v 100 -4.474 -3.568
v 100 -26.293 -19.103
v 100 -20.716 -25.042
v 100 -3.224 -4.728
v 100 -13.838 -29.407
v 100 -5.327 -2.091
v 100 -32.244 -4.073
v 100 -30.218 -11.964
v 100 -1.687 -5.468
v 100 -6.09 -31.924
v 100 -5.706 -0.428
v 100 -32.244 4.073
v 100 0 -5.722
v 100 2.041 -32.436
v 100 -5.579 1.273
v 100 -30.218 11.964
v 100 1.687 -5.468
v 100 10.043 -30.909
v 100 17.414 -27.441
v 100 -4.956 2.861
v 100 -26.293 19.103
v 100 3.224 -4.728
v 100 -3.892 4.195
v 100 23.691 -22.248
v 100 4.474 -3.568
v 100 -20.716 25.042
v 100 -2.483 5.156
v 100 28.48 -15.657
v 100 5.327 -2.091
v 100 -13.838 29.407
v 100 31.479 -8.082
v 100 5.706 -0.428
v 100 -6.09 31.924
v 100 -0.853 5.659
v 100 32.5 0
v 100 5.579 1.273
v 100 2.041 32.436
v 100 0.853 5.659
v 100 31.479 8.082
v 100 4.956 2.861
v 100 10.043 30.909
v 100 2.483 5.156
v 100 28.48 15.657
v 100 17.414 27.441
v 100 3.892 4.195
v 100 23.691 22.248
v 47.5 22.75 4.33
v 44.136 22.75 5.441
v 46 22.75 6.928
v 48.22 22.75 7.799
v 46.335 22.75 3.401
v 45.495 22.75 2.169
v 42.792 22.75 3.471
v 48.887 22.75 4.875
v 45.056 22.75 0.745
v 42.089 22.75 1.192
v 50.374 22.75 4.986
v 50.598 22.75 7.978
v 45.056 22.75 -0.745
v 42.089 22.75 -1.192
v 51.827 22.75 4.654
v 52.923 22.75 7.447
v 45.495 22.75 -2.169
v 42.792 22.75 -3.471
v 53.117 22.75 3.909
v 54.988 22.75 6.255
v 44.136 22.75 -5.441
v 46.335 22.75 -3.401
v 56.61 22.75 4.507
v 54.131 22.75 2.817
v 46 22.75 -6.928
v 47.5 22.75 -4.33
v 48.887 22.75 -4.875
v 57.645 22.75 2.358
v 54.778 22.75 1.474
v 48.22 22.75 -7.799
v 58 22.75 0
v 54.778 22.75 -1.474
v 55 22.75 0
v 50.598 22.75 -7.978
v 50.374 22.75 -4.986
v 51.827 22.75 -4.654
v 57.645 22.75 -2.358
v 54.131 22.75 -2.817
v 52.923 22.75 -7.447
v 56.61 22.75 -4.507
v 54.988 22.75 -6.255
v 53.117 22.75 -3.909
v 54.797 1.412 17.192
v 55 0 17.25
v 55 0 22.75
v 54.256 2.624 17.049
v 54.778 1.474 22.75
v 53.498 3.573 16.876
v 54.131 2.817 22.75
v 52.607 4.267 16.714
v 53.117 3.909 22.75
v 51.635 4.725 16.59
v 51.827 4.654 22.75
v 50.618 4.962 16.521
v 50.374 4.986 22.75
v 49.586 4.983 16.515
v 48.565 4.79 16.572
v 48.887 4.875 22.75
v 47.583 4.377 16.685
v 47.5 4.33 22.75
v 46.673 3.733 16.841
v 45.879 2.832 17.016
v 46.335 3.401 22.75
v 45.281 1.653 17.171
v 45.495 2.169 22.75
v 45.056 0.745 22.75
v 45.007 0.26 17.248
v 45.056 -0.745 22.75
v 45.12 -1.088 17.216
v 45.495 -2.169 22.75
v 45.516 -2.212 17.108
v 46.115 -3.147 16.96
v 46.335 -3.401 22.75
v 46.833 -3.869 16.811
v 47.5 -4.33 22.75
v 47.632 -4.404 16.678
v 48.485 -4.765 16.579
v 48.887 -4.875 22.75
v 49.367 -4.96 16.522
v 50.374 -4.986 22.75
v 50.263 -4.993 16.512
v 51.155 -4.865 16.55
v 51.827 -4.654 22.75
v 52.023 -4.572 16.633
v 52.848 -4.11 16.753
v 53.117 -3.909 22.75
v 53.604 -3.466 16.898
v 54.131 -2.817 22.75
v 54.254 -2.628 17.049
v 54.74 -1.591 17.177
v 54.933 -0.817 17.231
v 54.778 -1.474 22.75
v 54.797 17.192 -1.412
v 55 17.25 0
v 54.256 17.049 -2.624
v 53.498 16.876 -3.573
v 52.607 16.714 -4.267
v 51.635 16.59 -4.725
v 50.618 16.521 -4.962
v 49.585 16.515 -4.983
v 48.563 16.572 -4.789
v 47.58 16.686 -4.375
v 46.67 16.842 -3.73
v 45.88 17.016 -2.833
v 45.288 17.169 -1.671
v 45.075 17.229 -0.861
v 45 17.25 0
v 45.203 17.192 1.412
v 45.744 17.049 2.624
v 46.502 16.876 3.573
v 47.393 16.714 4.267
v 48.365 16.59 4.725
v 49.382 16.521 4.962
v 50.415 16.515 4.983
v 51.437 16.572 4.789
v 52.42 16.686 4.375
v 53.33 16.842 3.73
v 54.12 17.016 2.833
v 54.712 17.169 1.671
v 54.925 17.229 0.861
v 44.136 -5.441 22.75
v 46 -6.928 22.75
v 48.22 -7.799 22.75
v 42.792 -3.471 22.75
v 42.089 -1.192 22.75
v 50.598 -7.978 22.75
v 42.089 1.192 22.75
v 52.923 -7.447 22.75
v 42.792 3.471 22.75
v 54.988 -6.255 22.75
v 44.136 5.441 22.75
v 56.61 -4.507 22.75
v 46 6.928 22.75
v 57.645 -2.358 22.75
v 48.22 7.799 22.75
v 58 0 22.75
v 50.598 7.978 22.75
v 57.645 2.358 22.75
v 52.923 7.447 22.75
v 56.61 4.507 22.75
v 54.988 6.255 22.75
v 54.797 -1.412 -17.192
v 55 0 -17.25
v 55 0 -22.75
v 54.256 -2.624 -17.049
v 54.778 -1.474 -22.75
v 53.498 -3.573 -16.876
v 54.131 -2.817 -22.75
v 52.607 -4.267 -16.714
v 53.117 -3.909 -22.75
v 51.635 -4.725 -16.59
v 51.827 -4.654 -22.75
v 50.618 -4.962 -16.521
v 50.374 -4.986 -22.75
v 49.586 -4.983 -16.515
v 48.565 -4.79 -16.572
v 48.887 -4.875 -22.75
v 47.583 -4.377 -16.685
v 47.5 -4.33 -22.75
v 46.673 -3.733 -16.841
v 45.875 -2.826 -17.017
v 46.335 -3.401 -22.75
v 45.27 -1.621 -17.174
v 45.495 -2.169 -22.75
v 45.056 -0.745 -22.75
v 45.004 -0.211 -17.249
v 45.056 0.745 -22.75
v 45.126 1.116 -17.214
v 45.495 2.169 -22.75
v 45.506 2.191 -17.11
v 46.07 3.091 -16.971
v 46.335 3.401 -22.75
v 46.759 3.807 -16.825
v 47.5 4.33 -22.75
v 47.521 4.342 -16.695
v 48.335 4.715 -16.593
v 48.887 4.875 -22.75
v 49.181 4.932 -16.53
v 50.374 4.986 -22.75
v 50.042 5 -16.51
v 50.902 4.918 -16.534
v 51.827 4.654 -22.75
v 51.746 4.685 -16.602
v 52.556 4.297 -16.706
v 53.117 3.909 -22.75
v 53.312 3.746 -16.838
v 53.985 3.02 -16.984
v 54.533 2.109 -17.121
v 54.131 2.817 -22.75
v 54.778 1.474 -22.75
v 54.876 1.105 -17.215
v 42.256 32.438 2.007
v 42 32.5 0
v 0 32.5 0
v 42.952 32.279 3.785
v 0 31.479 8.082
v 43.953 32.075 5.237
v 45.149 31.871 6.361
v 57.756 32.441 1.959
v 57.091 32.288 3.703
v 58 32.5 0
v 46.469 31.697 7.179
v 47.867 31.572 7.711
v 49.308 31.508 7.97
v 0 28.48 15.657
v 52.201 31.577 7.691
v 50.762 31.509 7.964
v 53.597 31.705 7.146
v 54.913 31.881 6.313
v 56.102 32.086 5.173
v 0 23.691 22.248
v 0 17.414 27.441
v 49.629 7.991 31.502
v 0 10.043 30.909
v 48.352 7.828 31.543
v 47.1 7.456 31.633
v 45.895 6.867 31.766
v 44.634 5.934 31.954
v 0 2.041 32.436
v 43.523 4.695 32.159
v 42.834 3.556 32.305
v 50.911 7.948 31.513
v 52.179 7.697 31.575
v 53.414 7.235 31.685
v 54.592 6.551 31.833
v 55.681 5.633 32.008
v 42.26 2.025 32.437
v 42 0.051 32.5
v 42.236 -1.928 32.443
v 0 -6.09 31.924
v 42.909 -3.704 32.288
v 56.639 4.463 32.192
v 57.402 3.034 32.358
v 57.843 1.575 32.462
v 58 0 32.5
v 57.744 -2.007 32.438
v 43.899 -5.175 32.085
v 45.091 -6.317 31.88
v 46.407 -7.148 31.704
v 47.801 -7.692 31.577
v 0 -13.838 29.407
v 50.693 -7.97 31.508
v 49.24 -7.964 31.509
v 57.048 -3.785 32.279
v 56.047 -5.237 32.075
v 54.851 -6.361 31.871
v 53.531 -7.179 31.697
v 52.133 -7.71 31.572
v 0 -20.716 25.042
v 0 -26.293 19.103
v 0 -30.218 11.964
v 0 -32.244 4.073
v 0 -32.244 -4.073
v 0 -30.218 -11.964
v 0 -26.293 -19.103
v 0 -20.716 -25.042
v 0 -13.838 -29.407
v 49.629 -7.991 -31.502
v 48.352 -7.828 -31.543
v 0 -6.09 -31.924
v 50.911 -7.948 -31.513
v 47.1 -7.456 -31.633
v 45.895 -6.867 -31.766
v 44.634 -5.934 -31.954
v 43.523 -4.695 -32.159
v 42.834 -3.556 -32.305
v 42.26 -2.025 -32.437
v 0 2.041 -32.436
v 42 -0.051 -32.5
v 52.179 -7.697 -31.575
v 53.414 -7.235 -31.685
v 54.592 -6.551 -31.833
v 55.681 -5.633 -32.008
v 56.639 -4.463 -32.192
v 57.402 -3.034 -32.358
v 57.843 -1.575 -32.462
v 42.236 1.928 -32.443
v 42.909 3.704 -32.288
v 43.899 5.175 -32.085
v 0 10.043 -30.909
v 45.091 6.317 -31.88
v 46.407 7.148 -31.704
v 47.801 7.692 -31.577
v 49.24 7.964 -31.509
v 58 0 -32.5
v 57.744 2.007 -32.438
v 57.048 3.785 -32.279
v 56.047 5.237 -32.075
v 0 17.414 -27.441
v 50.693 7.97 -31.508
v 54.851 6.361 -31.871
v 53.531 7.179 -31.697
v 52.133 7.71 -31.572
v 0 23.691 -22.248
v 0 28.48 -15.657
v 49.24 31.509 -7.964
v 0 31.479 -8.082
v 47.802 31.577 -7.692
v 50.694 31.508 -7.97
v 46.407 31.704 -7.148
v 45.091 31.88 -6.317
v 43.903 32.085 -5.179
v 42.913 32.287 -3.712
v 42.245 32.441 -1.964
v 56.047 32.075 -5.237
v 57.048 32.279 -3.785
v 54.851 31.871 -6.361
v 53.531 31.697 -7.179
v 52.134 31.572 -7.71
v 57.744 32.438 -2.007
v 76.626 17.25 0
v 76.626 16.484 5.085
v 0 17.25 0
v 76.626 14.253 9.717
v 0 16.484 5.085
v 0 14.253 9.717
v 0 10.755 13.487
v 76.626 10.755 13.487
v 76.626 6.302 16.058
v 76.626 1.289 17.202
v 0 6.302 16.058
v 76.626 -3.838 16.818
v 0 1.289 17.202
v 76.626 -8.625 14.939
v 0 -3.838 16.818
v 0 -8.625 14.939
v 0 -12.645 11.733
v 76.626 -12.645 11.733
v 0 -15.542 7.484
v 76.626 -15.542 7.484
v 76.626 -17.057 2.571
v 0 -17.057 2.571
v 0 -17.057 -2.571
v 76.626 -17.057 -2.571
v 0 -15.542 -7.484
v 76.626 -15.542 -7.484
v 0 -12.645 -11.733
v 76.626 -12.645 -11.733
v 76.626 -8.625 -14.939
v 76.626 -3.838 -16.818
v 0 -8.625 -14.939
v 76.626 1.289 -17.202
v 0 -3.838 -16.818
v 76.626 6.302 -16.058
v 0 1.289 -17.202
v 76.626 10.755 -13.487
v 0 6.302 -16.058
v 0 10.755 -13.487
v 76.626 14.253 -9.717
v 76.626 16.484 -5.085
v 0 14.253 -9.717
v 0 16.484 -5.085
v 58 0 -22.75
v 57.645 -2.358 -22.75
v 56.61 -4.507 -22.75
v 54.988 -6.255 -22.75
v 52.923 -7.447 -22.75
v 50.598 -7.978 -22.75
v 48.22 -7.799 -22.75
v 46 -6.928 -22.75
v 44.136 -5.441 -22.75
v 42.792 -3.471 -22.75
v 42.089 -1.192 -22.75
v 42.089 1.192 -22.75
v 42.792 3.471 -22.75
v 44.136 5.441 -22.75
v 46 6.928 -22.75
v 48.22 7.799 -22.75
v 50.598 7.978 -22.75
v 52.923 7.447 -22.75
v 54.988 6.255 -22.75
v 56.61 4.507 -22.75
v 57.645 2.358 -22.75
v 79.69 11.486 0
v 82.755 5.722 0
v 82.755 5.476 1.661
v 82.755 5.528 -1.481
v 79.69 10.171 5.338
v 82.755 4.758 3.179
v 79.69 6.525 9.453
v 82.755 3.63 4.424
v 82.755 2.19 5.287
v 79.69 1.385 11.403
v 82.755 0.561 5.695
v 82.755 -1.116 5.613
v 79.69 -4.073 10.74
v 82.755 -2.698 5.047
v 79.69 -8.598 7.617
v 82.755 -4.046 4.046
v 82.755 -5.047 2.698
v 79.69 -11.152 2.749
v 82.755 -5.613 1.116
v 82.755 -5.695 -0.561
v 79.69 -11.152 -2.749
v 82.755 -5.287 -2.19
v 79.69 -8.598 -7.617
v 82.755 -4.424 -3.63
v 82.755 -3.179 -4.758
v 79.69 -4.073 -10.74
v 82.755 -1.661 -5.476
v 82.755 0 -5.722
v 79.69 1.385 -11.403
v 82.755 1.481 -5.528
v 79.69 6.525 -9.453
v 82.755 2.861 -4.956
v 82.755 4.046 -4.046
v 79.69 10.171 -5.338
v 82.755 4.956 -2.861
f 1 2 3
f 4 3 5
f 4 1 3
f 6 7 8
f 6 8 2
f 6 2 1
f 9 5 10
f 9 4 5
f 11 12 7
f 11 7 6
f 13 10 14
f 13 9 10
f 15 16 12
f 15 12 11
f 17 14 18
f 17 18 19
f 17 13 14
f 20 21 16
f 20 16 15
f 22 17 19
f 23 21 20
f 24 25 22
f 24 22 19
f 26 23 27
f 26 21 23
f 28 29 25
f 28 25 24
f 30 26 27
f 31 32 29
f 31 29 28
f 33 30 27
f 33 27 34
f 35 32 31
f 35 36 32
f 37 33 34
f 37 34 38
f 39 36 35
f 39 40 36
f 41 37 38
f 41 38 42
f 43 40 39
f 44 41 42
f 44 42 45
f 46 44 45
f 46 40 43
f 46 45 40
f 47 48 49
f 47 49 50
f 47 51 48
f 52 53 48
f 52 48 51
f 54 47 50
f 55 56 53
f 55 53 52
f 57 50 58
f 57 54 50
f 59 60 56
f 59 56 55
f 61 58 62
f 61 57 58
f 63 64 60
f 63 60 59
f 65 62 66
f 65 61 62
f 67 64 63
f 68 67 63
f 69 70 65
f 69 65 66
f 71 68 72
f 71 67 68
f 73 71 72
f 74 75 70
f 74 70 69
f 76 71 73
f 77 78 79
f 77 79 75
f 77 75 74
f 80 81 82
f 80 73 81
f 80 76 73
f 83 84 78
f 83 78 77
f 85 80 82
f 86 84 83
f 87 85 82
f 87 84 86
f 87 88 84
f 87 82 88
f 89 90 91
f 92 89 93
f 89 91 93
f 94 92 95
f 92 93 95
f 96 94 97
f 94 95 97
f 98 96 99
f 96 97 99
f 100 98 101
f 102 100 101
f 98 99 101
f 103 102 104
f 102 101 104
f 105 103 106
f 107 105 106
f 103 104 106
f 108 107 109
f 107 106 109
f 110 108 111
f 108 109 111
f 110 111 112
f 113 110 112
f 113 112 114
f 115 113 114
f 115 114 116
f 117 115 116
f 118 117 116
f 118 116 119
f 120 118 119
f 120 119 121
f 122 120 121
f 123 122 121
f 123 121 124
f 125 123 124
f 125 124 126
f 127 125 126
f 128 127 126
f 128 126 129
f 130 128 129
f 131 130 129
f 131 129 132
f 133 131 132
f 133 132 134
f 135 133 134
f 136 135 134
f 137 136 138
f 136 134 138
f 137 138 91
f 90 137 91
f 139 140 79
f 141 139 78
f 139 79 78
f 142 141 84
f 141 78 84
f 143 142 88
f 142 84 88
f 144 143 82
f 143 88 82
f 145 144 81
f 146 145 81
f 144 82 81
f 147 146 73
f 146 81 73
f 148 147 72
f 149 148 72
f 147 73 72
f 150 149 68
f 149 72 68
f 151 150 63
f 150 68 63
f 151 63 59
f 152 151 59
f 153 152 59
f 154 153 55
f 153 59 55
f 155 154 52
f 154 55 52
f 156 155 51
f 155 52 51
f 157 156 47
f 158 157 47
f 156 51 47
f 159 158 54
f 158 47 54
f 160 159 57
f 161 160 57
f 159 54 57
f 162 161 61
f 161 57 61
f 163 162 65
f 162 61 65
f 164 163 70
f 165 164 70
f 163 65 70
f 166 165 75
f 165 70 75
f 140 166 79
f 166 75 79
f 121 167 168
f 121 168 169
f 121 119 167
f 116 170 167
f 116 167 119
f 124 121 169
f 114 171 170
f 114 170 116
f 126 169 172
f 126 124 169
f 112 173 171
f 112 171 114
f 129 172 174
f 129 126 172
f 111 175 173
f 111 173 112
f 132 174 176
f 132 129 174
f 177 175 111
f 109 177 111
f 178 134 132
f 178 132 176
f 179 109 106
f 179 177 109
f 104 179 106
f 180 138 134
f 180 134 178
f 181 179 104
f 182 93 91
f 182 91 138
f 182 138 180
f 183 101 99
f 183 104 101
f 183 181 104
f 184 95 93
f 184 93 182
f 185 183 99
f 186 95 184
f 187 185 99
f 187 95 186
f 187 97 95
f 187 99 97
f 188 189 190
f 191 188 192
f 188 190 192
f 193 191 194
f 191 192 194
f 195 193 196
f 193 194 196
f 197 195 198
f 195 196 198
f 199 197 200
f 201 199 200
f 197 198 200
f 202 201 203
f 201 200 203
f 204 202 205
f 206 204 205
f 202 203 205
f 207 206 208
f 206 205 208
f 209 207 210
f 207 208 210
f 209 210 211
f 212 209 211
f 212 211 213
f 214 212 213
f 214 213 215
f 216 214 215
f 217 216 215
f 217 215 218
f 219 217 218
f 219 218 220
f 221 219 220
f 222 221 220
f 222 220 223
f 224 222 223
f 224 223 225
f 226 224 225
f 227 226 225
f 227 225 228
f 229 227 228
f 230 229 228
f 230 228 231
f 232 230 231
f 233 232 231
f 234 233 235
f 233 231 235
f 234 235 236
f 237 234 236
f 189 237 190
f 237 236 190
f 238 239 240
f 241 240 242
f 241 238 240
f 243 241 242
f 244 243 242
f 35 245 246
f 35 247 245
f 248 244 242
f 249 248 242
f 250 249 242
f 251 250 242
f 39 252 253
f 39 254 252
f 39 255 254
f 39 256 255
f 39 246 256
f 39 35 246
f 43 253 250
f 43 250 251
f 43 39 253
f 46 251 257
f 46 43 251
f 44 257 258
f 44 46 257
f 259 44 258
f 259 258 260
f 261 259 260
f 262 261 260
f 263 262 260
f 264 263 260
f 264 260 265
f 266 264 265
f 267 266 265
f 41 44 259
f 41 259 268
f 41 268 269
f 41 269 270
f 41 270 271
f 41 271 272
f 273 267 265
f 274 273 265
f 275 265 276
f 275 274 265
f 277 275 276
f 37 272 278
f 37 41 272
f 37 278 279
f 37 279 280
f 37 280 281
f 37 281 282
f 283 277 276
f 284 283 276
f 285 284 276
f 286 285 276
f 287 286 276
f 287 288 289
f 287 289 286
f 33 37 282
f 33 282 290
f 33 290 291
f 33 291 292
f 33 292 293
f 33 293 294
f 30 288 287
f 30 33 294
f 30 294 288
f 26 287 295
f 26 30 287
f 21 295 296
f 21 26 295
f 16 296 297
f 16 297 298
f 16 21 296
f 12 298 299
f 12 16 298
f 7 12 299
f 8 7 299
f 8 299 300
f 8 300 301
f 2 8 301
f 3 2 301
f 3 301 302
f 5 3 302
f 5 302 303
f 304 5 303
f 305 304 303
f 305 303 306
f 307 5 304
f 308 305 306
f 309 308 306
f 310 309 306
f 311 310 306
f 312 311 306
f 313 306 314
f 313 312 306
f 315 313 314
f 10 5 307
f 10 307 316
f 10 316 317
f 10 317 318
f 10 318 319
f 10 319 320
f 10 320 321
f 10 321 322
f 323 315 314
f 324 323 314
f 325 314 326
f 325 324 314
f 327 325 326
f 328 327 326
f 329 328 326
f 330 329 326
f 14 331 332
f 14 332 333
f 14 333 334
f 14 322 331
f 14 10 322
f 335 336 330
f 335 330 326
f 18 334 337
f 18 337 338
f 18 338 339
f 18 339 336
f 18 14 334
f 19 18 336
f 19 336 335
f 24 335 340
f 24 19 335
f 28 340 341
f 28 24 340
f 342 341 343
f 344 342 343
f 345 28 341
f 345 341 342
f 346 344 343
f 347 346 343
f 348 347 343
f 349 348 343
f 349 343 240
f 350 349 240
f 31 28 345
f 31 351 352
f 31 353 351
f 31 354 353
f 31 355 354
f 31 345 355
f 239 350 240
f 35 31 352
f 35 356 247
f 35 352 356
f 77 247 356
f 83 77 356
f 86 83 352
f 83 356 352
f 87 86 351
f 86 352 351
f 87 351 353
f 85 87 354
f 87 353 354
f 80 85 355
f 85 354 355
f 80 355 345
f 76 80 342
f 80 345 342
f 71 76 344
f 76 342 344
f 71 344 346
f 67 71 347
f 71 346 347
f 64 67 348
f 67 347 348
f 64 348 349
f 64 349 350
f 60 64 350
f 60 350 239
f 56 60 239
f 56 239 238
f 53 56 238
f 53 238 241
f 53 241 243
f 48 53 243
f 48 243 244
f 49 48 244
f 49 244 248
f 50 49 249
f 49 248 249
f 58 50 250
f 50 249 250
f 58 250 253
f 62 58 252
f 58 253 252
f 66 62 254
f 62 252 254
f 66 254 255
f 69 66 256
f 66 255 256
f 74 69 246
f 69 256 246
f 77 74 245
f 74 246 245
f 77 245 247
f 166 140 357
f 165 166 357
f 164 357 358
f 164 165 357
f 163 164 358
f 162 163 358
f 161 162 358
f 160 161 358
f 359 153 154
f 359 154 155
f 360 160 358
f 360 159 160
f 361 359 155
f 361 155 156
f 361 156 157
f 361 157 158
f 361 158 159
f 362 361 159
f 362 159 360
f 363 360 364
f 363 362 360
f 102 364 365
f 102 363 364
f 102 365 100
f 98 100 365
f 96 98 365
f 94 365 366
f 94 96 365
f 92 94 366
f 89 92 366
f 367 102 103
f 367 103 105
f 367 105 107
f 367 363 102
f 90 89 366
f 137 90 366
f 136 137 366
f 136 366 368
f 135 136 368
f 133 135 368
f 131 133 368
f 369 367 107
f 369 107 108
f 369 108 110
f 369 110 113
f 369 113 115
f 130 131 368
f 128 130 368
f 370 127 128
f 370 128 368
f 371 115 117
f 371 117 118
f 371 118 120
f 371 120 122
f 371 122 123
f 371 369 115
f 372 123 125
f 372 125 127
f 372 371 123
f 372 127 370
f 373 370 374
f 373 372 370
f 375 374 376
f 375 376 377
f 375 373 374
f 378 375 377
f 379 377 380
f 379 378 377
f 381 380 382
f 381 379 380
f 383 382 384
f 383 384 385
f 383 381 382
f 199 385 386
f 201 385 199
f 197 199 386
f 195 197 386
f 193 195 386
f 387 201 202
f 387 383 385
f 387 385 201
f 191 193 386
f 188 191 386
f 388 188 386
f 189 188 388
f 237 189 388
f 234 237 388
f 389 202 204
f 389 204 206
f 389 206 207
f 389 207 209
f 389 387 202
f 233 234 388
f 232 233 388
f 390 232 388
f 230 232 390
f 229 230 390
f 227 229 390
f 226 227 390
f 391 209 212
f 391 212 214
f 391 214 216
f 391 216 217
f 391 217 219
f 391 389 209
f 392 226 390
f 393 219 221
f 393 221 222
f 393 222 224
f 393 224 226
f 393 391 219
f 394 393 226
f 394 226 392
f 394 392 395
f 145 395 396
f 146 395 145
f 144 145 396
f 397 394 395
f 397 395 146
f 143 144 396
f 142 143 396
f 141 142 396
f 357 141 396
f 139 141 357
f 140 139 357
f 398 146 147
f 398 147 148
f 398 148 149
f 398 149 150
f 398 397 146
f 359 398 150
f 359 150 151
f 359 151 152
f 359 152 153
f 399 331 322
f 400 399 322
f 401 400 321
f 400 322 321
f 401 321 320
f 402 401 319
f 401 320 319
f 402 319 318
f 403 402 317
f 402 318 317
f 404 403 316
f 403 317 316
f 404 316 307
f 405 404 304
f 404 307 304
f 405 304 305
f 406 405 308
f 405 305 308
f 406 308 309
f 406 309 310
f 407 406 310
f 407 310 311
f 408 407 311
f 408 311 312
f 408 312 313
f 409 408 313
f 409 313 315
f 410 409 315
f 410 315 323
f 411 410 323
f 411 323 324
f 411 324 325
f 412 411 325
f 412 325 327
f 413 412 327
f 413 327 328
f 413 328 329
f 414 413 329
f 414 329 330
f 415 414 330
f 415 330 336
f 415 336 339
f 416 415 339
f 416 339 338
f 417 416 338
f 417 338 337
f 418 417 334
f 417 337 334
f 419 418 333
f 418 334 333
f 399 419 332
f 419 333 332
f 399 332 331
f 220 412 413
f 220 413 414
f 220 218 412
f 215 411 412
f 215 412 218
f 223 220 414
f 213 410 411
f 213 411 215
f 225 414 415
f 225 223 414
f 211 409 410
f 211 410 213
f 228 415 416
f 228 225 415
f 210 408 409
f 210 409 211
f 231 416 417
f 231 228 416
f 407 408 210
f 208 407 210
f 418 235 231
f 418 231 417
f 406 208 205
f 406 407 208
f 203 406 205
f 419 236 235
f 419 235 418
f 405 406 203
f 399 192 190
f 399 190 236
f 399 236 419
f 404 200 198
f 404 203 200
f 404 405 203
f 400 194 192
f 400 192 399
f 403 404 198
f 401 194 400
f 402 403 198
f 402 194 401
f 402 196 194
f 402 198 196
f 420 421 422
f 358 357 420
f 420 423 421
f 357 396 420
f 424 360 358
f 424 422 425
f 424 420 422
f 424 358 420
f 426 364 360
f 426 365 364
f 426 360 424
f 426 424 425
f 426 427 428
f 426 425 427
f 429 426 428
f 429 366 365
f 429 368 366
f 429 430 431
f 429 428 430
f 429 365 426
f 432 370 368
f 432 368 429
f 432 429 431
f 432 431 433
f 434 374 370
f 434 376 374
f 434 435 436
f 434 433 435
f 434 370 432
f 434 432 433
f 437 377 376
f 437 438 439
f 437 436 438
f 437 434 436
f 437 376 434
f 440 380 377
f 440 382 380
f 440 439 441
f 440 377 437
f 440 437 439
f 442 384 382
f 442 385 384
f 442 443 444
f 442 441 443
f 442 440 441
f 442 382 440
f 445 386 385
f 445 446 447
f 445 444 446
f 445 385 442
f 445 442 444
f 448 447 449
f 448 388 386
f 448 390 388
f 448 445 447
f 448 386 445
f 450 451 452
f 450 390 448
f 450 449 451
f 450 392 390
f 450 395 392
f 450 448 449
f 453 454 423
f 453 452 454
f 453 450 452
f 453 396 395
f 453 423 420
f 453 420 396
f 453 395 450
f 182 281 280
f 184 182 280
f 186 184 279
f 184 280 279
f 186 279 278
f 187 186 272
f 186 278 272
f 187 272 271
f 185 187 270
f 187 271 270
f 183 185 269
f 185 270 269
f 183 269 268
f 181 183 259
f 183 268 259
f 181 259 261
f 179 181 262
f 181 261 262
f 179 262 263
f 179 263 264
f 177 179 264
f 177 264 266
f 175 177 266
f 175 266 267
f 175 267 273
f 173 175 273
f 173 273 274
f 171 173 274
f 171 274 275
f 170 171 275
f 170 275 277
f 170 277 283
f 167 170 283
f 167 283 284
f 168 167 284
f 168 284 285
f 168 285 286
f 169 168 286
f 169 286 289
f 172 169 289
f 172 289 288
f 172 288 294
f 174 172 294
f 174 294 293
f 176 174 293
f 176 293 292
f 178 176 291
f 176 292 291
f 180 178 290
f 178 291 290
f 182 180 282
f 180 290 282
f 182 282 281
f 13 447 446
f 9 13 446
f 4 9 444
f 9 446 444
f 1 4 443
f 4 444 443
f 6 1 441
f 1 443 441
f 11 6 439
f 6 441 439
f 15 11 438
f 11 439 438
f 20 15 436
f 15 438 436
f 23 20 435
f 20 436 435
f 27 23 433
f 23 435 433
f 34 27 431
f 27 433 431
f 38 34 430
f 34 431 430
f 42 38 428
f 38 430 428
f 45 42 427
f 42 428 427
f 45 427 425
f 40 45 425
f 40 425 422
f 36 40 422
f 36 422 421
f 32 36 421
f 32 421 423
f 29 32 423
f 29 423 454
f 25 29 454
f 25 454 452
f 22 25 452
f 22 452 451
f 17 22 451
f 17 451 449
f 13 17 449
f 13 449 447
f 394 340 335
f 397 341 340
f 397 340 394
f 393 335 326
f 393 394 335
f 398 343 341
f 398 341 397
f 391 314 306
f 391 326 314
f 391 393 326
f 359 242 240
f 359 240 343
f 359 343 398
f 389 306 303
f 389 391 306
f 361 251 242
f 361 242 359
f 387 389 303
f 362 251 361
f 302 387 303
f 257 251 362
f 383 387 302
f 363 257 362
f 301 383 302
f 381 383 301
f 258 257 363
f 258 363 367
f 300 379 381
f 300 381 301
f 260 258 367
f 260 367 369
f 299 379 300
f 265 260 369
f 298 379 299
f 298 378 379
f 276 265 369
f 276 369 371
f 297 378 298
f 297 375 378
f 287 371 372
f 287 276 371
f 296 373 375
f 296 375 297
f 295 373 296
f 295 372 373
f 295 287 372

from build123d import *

# Parameters (mm, degrees)
G1_4_GEWINDEBOHRUNG1_D          = 11.445
G1_4_GEWINDEBOHRUNG1_DEPTH      = 100
SKIZZE6_R                       = 8
SCHNITT_LINEAR_AUSTRAGEN1_DEPTH = 9.75
SKIZZE7_R                       = 5
SCHNITT_LINEAR_AUSTRAGEN2_DEPTH = 30
KREISMUSTER1_COUNT              = 3
KREISMUSTER1_ANGLE              = 180


with BuildPart() as part:
    # Skizze1 → Rotation1 (revolve)
    with BuildSketch(Plane.XY):
        Polygon((0, 17.25), (0, 32.5), (100, 32.5), (100, 1.5), (85, 1.5), (76.625576451, 17.25), align=None)
    revolve(axis=Axis((0, 0, 0), (1, 0, 0)))

    # G1/4 Gewindebohrung1
    with Locations(Plane(origin=(100, 0, 0), x_dir=(0, 0, 1), z_dir=(1, 0, 0))):
        with Locations((0, 0)):
            Hole(G1_4_GEWINDEBOHRUNG1_D / 2, depth=G1_4_GEWINDEBOHRUNG1_DEPTH)

    # Skizze6 → Schnitt-Linear austragen1 (cut)
    with BuildSketch(Plane.XY.offset(32.5)):
        with Locations((50, 0)):
            Circle(SKIZZE6_R)
    schnitt_linear_austragen1 = extrude(amount=-SCHNITT_LINEAR_AUSTRAGEN1_DEPTH, mode=Mode.SUBTRACT)

    # Skizze7 → Schnitt-Linear austragen2 (cut)
    with BuildSketch(Plane.XY.offset(32.5)):
        with Locations((50, 0)):
            Circle(SKIZZE7_R)
    schnitt_linear_austragen2 = extrude(amount=-SCHNITT_LINEAR_AUSTRAGEN2_DEPTH, mode=Mode.SUBTRACT)

    # Kreismuster1: Schnitt-Linear austragen1, Schnitt-Linear austragen2 ×3 about axis
    kreismuster1_axis = Axis((0, 0, 0), (-1, 0, 0))
    for i in range(1, KREISMUSTER1_COUNT):
        add(schnitt_linear_austragen1.rotate(kreismuster1_axis, i * KREISMUSTER1_ANGLE / (KREISMUSTER1_COUNT - 1)), mode=Mode.SUBTRACT)
        add(schnitt_linear_austragen2.rotate(kreismuster1_axis, i * KREISMUSTER1_ANGLE / (KREISMUSTER1_COUNT - 1)), mode=Mode.SUBTRACT)


solid = part.part
